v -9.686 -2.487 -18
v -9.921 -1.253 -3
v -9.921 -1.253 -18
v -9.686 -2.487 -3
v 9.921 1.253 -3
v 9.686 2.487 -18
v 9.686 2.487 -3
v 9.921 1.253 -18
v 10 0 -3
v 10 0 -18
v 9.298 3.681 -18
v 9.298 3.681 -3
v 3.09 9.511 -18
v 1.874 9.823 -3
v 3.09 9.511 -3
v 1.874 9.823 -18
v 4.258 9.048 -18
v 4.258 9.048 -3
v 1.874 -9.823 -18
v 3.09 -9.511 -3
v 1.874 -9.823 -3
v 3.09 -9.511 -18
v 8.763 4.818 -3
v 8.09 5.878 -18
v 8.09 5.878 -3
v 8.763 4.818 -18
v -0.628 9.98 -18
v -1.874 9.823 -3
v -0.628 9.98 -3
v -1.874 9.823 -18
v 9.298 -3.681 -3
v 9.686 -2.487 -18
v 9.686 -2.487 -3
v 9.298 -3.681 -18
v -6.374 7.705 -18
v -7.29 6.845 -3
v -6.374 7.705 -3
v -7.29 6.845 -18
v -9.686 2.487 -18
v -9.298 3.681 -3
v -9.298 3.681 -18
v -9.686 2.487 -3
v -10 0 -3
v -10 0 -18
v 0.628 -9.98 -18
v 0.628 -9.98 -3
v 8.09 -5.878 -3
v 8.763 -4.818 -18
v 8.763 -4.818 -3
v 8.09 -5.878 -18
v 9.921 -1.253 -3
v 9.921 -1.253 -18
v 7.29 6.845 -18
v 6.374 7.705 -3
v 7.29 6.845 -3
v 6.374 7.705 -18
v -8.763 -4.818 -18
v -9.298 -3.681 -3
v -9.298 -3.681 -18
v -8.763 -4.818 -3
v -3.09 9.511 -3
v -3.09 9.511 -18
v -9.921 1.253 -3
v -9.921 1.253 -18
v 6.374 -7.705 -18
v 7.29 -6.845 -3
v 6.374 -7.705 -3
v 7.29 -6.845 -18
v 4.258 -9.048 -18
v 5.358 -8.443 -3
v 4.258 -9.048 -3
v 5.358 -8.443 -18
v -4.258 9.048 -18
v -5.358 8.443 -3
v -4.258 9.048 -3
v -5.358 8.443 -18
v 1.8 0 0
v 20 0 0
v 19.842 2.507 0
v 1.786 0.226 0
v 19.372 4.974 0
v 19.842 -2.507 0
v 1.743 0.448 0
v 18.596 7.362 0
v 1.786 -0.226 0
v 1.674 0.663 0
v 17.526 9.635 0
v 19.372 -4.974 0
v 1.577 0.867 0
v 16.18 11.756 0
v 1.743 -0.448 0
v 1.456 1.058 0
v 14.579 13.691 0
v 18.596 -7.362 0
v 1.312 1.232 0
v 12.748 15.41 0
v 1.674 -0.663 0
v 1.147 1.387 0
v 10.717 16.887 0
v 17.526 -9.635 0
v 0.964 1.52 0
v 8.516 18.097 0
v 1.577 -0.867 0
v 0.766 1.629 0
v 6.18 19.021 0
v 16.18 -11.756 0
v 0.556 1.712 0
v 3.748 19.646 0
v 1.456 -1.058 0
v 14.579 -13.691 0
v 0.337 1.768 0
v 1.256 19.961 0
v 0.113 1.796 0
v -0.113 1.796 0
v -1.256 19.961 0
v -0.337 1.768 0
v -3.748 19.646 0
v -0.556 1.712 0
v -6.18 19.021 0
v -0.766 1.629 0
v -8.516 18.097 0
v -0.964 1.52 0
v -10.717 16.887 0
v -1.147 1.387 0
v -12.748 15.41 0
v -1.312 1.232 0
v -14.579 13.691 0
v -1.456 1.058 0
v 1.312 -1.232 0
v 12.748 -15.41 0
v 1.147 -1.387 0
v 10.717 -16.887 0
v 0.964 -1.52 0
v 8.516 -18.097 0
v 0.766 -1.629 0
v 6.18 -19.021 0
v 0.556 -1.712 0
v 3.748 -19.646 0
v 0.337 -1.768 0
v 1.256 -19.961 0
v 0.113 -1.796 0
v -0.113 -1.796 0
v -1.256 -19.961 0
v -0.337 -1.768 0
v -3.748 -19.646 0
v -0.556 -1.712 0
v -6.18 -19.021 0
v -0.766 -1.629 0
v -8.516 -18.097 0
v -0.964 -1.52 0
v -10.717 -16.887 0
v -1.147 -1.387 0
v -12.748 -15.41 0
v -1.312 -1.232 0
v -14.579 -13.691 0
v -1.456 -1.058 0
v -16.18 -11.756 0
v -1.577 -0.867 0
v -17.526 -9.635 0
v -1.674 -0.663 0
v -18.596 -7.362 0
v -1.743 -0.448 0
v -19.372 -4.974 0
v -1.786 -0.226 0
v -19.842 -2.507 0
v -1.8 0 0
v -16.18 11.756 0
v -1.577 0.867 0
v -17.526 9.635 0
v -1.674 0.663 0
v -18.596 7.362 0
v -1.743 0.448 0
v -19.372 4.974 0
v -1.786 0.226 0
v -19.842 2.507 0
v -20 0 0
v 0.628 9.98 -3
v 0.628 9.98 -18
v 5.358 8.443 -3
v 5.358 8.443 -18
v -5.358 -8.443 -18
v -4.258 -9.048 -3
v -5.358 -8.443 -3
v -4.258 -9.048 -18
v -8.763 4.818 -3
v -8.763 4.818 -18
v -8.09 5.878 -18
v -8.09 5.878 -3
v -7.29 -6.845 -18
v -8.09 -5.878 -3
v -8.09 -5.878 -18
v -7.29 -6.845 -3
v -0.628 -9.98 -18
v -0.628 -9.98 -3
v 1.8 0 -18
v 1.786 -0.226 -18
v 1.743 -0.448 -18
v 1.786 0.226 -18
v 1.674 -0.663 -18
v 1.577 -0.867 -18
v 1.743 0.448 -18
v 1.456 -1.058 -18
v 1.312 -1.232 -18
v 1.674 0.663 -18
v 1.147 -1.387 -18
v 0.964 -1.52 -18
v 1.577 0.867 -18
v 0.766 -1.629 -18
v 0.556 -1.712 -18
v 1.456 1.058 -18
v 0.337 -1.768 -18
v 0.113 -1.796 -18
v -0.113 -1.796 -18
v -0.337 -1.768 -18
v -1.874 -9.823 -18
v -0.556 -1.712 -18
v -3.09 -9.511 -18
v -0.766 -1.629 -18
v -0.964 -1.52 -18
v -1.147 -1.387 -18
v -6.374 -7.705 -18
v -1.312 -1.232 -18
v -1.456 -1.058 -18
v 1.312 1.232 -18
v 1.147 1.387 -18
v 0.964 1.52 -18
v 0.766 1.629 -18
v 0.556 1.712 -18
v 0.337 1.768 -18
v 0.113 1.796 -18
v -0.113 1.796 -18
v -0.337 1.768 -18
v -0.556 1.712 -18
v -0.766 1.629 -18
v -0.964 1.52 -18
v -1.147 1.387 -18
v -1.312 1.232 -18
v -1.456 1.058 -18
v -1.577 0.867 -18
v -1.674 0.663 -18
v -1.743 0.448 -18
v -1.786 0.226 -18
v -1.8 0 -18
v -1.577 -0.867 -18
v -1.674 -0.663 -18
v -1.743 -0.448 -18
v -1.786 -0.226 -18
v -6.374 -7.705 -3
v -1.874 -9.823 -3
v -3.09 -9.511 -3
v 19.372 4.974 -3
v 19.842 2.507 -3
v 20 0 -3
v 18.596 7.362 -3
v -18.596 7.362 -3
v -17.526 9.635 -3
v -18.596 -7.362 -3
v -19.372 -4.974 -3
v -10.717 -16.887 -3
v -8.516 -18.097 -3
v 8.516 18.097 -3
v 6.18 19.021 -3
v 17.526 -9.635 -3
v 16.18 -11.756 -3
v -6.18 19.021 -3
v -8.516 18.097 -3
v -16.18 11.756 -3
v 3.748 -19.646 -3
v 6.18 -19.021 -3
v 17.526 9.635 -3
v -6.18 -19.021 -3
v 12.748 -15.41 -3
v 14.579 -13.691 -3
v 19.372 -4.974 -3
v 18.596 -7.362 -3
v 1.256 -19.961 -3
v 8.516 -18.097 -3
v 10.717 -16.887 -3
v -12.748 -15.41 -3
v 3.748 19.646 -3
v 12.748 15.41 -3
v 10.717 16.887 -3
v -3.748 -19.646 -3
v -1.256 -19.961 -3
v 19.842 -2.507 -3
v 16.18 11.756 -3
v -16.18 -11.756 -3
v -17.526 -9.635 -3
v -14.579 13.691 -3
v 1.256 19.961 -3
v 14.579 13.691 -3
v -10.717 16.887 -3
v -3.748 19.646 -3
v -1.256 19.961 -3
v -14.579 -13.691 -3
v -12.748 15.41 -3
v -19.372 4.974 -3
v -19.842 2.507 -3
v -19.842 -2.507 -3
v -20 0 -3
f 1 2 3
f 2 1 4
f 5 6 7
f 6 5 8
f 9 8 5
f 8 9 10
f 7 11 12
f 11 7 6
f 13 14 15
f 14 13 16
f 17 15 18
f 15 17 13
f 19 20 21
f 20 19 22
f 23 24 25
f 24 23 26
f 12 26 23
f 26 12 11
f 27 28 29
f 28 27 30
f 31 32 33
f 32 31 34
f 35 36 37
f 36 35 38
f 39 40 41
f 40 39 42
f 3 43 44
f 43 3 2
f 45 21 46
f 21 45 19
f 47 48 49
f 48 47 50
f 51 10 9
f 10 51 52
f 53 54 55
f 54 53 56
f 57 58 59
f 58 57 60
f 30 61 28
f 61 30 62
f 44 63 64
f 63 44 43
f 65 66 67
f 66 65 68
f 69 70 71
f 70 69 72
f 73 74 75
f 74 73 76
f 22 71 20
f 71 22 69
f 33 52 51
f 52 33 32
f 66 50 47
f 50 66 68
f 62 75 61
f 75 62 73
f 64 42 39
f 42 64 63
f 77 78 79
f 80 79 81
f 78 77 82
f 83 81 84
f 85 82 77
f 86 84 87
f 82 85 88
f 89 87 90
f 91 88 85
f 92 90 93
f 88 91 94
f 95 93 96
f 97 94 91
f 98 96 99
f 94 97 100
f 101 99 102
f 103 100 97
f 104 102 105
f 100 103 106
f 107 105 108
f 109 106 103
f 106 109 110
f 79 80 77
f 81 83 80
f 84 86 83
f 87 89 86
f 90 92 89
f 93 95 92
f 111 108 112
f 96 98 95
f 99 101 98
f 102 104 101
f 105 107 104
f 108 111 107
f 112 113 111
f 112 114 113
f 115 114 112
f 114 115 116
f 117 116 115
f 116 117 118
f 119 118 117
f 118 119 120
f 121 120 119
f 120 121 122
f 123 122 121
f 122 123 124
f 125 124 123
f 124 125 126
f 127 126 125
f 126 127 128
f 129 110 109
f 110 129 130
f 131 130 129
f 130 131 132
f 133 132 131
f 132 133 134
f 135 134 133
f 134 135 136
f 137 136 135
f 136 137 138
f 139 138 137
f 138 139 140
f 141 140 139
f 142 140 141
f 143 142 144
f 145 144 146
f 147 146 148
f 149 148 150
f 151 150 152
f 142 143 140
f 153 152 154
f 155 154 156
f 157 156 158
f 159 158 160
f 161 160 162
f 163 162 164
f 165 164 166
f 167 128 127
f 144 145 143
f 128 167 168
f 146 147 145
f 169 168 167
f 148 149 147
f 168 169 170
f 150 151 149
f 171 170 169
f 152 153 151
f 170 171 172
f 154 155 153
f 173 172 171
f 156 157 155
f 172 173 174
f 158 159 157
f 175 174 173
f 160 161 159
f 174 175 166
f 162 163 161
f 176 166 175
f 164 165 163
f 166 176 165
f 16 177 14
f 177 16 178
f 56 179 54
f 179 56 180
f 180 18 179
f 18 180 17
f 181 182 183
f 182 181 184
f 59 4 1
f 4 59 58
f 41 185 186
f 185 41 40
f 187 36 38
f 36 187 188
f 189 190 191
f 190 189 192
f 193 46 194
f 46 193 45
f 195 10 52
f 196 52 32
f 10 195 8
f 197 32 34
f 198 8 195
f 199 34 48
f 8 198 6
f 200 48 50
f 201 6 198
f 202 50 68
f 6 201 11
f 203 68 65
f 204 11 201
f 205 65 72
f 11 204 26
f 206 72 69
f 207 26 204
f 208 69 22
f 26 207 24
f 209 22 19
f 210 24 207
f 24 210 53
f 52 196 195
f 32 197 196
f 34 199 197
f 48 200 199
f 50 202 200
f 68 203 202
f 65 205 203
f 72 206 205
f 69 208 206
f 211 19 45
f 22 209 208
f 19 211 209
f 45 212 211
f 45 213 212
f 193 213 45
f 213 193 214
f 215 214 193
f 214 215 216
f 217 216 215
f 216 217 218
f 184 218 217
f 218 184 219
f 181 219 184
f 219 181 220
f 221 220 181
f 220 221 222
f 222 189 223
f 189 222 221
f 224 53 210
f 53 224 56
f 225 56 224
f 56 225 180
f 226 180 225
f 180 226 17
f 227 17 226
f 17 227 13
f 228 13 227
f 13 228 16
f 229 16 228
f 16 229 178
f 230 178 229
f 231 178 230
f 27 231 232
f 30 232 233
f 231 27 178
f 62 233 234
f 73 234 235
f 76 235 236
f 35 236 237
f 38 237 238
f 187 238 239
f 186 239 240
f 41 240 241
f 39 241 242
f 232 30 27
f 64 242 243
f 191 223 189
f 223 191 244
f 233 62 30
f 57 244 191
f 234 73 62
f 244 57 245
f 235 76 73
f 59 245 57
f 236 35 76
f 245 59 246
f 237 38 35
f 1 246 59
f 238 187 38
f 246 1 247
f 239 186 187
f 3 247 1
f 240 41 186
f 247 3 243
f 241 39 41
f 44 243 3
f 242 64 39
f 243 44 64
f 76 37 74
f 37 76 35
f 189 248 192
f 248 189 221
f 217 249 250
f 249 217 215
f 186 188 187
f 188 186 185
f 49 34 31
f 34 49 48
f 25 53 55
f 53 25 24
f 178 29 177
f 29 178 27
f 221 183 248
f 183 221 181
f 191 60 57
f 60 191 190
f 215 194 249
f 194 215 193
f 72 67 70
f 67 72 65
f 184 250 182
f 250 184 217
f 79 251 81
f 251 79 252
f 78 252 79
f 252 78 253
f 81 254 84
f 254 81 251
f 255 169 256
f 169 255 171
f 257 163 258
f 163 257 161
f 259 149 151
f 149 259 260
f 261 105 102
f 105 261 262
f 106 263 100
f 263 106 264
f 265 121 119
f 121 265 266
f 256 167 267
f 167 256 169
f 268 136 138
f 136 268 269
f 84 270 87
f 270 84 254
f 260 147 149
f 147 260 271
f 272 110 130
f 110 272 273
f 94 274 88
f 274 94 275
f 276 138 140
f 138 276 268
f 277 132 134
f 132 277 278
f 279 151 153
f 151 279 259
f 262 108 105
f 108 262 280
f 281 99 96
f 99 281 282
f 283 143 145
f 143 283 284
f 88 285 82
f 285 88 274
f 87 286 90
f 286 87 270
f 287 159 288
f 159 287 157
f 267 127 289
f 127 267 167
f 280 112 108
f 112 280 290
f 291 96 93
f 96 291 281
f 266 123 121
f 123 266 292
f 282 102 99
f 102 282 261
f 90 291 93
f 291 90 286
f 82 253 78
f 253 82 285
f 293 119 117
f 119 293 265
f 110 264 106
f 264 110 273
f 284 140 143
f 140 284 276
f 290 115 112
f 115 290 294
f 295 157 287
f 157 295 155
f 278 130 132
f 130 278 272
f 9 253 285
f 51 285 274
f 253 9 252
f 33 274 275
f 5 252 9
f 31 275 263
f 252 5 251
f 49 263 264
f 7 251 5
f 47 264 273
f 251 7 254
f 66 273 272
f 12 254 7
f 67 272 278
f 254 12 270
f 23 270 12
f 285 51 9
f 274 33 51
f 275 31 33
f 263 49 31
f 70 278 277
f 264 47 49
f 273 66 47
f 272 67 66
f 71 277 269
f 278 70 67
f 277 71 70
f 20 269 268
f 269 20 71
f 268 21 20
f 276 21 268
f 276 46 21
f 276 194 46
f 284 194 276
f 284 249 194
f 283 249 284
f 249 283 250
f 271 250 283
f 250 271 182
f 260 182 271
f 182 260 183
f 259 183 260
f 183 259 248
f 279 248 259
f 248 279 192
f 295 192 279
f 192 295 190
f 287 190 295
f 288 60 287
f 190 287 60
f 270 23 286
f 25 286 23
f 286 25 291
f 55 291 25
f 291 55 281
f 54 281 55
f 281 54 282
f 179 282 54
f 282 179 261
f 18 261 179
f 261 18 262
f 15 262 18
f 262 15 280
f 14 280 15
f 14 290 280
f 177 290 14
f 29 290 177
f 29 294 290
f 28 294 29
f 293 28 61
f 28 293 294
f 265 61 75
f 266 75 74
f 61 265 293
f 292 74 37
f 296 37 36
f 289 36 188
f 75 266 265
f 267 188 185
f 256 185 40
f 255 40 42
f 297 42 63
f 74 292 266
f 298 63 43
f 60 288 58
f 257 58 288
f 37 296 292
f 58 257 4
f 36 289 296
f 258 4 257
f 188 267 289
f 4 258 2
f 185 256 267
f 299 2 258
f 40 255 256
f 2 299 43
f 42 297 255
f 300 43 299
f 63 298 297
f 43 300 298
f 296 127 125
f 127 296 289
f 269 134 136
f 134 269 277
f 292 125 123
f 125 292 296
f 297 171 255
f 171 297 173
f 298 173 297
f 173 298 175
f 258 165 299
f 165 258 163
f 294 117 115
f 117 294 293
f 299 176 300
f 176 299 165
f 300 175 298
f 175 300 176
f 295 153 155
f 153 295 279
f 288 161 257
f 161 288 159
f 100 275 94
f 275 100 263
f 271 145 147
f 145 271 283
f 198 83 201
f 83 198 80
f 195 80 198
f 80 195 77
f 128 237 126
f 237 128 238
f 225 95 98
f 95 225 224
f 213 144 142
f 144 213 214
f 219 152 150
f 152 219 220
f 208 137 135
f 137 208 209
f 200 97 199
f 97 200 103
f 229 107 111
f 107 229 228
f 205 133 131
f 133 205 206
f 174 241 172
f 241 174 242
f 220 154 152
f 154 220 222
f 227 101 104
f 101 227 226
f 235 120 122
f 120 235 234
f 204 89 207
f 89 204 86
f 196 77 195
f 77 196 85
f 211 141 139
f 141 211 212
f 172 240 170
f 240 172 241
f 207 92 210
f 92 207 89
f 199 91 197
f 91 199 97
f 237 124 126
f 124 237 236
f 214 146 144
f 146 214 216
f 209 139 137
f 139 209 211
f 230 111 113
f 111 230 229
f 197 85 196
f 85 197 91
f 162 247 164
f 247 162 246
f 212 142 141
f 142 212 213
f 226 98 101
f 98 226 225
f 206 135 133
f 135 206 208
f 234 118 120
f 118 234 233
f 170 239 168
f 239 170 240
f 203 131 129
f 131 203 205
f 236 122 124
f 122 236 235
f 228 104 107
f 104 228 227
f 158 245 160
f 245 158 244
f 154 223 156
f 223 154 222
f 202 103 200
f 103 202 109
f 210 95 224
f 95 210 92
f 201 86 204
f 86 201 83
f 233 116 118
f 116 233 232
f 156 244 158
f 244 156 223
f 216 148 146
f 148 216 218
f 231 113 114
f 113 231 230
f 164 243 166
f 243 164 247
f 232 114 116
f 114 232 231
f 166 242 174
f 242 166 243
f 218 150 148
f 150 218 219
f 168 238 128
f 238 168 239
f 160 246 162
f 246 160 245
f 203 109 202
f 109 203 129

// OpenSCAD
$fn = 50;


difference() {
	union() {
		translate(v = [0, 0, -18.0000000000]) {
			cylinder(h = 18, r = 10.0000000000);
		}
		translate(v = [0, 0, -3.0000000000]) {
			cylinder(h = 3, r = 20.0000000000);
		}
	}
	union() {
		#translate(v = [0, 0, -18]) {
			cylinder(h = 18, r = 1.8000000000);
		}
	}
}
